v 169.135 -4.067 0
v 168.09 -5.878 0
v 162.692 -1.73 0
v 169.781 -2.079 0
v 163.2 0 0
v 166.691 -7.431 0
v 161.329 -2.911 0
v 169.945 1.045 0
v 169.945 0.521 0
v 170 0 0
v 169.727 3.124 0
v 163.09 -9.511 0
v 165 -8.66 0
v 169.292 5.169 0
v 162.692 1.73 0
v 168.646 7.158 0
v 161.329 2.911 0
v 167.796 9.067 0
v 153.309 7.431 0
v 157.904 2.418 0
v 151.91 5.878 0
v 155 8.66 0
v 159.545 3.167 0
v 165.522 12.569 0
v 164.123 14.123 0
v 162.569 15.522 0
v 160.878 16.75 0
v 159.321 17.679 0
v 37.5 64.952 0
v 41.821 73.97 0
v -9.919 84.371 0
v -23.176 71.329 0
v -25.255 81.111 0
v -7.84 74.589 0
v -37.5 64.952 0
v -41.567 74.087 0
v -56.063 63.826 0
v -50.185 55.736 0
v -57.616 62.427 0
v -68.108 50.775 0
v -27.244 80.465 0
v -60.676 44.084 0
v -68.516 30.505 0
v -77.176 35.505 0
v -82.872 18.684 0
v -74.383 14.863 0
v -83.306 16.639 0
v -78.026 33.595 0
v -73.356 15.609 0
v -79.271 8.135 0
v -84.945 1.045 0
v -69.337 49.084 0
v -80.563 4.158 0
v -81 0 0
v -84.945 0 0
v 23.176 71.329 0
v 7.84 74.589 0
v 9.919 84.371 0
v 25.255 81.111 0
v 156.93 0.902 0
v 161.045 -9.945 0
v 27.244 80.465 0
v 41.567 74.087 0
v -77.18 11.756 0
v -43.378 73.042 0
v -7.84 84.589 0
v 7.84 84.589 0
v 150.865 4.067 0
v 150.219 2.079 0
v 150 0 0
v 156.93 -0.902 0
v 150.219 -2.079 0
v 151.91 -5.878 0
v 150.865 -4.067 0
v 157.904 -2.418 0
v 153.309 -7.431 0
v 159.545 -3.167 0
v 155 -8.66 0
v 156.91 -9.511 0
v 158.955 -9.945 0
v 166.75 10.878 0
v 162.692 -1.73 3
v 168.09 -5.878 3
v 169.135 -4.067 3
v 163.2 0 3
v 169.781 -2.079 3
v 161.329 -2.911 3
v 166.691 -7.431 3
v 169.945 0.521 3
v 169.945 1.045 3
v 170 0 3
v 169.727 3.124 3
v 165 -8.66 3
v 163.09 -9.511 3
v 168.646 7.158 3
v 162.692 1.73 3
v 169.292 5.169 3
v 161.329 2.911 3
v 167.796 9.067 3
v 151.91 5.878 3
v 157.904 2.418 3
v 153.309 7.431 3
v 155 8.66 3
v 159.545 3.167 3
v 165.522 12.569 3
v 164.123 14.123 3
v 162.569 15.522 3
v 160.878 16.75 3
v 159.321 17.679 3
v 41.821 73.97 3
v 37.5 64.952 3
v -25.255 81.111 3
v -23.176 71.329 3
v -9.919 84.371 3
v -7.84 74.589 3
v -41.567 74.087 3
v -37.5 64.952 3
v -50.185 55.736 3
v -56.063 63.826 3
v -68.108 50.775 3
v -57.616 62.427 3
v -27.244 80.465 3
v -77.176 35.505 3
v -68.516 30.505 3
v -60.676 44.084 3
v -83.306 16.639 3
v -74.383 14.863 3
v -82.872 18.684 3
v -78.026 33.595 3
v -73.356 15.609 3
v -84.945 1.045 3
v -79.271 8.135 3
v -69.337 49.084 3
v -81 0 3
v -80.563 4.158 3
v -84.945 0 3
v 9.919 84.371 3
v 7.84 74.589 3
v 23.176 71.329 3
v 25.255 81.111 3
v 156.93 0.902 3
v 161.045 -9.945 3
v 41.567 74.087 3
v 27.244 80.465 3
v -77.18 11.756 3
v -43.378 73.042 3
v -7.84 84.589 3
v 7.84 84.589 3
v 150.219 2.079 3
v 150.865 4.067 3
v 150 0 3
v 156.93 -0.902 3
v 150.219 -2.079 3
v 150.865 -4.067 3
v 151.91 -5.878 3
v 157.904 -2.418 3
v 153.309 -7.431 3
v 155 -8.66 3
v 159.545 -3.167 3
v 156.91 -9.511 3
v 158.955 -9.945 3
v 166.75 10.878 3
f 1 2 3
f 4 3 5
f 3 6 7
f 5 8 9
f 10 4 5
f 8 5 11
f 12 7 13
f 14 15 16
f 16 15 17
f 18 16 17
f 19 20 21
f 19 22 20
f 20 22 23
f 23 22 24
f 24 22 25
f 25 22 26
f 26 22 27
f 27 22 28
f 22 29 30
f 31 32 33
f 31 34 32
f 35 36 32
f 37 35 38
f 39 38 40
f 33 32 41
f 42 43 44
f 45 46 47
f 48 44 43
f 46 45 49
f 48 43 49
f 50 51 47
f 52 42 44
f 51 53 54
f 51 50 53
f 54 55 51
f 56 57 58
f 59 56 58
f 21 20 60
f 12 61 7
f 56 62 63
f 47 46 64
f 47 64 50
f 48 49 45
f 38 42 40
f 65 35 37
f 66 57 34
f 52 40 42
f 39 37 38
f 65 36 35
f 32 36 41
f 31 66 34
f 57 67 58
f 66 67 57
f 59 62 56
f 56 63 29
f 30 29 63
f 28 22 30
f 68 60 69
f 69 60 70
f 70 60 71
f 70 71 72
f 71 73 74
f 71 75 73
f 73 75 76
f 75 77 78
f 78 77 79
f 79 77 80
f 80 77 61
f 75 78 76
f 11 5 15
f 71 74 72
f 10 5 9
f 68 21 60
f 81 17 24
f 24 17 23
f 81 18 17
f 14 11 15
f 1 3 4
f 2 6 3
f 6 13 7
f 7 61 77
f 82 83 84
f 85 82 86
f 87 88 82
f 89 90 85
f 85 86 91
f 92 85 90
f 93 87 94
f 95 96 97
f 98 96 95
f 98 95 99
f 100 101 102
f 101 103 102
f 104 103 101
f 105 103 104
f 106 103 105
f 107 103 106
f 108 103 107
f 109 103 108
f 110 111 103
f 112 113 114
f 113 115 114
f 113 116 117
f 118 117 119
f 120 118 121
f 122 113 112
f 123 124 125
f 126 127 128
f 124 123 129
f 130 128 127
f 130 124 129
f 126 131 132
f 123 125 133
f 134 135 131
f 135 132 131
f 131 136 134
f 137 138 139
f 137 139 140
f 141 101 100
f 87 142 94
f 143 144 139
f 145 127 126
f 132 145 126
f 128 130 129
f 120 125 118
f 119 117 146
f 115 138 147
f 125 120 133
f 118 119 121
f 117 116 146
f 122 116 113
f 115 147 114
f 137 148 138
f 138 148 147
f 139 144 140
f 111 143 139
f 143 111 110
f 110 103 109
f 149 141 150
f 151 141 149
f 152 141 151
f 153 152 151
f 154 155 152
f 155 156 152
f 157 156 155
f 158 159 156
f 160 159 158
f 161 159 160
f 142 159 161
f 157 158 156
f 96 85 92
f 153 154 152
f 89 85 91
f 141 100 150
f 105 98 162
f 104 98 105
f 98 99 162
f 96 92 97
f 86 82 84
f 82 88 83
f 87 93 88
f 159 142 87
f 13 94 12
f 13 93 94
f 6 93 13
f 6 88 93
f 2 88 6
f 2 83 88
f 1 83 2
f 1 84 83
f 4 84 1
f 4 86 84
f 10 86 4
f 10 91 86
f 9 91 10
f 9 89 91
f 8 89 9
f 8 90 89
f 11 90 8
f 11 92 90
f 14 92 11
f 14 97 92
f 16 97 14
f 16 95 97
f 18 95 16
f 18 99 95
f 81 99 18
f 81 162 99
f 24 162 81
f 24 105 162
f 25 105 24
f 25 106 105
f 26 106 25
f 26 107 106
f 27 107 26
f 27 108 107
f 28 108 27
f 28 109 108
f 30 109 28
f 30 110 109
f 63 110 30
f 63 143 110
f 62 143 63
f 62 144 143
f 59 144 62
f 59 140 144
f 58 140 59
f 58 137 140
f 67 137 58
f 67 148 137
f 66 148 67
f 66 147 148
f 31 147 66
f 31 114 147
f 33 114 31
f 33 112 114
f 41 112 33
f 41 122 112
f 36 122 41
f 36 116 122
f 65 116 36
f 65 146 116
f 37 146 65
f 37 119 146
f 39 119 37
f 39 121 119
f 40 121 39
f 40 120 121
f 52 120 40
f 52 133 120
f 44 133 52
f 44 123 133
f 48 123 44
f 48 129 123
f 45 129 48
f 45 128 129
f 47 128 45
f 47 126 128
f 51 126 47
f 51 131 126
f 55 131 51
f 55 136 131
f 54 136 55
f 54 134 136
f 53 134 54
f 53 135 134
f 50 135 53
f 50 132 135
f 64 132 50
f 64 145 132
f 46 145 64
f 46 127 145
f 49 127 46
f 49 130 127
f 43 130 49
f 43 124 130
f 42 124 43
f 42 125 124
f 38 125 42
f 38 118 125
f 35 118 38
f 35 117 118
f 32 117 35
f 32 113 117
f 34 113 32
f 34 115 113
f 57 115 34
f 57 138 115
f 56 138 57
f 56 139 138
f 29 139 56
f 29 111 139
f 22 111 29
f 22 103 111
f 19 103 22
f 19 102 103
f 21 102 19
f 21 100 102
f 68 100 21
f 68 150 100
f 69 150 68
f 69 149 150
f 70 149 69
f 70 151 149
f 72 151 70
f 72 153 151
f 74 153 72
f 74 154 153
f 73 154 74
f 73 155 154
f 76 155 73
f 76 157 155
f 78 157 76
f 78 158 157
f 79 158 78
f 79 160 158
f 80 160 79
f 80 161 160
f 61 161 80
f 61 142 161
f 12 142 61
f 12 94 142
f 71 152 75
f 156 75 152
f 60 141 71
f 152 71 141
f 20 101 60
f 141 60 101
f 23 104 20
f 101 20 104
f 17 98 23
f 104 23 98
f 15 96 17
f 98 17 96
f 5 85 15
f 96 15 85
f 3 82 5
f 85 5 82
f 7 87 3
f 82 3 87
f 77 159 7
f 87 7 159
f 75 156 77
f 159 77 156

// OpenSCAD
module caliperShape(length) {
    difference() {
        offset(10)
        hull() {
       
        circle(d=length);
        translate([length,0])

        circle(d=20);
        }
        hull() {
       
        circle(d=length);
        translate([length,0])

        circle(d=20);
        }
    }
    translate([length+10,0])
    circle(d=20);
}

module caliperLeg(length) {
    difference(){
        caliperShape(length);
        union(){
            difference(){
                translate([0,-(3*length)/2])
                square(3*length, center=true);
                translate([length+10,0])
                circle(d=20);
            }
            translate([-length/2+12 +2,0])
            circle(d=40);
            translate([length+10,0])
            circle(d=6.4);
        }
    }
}
linear_extrude(3)
caliperLeg(150);
